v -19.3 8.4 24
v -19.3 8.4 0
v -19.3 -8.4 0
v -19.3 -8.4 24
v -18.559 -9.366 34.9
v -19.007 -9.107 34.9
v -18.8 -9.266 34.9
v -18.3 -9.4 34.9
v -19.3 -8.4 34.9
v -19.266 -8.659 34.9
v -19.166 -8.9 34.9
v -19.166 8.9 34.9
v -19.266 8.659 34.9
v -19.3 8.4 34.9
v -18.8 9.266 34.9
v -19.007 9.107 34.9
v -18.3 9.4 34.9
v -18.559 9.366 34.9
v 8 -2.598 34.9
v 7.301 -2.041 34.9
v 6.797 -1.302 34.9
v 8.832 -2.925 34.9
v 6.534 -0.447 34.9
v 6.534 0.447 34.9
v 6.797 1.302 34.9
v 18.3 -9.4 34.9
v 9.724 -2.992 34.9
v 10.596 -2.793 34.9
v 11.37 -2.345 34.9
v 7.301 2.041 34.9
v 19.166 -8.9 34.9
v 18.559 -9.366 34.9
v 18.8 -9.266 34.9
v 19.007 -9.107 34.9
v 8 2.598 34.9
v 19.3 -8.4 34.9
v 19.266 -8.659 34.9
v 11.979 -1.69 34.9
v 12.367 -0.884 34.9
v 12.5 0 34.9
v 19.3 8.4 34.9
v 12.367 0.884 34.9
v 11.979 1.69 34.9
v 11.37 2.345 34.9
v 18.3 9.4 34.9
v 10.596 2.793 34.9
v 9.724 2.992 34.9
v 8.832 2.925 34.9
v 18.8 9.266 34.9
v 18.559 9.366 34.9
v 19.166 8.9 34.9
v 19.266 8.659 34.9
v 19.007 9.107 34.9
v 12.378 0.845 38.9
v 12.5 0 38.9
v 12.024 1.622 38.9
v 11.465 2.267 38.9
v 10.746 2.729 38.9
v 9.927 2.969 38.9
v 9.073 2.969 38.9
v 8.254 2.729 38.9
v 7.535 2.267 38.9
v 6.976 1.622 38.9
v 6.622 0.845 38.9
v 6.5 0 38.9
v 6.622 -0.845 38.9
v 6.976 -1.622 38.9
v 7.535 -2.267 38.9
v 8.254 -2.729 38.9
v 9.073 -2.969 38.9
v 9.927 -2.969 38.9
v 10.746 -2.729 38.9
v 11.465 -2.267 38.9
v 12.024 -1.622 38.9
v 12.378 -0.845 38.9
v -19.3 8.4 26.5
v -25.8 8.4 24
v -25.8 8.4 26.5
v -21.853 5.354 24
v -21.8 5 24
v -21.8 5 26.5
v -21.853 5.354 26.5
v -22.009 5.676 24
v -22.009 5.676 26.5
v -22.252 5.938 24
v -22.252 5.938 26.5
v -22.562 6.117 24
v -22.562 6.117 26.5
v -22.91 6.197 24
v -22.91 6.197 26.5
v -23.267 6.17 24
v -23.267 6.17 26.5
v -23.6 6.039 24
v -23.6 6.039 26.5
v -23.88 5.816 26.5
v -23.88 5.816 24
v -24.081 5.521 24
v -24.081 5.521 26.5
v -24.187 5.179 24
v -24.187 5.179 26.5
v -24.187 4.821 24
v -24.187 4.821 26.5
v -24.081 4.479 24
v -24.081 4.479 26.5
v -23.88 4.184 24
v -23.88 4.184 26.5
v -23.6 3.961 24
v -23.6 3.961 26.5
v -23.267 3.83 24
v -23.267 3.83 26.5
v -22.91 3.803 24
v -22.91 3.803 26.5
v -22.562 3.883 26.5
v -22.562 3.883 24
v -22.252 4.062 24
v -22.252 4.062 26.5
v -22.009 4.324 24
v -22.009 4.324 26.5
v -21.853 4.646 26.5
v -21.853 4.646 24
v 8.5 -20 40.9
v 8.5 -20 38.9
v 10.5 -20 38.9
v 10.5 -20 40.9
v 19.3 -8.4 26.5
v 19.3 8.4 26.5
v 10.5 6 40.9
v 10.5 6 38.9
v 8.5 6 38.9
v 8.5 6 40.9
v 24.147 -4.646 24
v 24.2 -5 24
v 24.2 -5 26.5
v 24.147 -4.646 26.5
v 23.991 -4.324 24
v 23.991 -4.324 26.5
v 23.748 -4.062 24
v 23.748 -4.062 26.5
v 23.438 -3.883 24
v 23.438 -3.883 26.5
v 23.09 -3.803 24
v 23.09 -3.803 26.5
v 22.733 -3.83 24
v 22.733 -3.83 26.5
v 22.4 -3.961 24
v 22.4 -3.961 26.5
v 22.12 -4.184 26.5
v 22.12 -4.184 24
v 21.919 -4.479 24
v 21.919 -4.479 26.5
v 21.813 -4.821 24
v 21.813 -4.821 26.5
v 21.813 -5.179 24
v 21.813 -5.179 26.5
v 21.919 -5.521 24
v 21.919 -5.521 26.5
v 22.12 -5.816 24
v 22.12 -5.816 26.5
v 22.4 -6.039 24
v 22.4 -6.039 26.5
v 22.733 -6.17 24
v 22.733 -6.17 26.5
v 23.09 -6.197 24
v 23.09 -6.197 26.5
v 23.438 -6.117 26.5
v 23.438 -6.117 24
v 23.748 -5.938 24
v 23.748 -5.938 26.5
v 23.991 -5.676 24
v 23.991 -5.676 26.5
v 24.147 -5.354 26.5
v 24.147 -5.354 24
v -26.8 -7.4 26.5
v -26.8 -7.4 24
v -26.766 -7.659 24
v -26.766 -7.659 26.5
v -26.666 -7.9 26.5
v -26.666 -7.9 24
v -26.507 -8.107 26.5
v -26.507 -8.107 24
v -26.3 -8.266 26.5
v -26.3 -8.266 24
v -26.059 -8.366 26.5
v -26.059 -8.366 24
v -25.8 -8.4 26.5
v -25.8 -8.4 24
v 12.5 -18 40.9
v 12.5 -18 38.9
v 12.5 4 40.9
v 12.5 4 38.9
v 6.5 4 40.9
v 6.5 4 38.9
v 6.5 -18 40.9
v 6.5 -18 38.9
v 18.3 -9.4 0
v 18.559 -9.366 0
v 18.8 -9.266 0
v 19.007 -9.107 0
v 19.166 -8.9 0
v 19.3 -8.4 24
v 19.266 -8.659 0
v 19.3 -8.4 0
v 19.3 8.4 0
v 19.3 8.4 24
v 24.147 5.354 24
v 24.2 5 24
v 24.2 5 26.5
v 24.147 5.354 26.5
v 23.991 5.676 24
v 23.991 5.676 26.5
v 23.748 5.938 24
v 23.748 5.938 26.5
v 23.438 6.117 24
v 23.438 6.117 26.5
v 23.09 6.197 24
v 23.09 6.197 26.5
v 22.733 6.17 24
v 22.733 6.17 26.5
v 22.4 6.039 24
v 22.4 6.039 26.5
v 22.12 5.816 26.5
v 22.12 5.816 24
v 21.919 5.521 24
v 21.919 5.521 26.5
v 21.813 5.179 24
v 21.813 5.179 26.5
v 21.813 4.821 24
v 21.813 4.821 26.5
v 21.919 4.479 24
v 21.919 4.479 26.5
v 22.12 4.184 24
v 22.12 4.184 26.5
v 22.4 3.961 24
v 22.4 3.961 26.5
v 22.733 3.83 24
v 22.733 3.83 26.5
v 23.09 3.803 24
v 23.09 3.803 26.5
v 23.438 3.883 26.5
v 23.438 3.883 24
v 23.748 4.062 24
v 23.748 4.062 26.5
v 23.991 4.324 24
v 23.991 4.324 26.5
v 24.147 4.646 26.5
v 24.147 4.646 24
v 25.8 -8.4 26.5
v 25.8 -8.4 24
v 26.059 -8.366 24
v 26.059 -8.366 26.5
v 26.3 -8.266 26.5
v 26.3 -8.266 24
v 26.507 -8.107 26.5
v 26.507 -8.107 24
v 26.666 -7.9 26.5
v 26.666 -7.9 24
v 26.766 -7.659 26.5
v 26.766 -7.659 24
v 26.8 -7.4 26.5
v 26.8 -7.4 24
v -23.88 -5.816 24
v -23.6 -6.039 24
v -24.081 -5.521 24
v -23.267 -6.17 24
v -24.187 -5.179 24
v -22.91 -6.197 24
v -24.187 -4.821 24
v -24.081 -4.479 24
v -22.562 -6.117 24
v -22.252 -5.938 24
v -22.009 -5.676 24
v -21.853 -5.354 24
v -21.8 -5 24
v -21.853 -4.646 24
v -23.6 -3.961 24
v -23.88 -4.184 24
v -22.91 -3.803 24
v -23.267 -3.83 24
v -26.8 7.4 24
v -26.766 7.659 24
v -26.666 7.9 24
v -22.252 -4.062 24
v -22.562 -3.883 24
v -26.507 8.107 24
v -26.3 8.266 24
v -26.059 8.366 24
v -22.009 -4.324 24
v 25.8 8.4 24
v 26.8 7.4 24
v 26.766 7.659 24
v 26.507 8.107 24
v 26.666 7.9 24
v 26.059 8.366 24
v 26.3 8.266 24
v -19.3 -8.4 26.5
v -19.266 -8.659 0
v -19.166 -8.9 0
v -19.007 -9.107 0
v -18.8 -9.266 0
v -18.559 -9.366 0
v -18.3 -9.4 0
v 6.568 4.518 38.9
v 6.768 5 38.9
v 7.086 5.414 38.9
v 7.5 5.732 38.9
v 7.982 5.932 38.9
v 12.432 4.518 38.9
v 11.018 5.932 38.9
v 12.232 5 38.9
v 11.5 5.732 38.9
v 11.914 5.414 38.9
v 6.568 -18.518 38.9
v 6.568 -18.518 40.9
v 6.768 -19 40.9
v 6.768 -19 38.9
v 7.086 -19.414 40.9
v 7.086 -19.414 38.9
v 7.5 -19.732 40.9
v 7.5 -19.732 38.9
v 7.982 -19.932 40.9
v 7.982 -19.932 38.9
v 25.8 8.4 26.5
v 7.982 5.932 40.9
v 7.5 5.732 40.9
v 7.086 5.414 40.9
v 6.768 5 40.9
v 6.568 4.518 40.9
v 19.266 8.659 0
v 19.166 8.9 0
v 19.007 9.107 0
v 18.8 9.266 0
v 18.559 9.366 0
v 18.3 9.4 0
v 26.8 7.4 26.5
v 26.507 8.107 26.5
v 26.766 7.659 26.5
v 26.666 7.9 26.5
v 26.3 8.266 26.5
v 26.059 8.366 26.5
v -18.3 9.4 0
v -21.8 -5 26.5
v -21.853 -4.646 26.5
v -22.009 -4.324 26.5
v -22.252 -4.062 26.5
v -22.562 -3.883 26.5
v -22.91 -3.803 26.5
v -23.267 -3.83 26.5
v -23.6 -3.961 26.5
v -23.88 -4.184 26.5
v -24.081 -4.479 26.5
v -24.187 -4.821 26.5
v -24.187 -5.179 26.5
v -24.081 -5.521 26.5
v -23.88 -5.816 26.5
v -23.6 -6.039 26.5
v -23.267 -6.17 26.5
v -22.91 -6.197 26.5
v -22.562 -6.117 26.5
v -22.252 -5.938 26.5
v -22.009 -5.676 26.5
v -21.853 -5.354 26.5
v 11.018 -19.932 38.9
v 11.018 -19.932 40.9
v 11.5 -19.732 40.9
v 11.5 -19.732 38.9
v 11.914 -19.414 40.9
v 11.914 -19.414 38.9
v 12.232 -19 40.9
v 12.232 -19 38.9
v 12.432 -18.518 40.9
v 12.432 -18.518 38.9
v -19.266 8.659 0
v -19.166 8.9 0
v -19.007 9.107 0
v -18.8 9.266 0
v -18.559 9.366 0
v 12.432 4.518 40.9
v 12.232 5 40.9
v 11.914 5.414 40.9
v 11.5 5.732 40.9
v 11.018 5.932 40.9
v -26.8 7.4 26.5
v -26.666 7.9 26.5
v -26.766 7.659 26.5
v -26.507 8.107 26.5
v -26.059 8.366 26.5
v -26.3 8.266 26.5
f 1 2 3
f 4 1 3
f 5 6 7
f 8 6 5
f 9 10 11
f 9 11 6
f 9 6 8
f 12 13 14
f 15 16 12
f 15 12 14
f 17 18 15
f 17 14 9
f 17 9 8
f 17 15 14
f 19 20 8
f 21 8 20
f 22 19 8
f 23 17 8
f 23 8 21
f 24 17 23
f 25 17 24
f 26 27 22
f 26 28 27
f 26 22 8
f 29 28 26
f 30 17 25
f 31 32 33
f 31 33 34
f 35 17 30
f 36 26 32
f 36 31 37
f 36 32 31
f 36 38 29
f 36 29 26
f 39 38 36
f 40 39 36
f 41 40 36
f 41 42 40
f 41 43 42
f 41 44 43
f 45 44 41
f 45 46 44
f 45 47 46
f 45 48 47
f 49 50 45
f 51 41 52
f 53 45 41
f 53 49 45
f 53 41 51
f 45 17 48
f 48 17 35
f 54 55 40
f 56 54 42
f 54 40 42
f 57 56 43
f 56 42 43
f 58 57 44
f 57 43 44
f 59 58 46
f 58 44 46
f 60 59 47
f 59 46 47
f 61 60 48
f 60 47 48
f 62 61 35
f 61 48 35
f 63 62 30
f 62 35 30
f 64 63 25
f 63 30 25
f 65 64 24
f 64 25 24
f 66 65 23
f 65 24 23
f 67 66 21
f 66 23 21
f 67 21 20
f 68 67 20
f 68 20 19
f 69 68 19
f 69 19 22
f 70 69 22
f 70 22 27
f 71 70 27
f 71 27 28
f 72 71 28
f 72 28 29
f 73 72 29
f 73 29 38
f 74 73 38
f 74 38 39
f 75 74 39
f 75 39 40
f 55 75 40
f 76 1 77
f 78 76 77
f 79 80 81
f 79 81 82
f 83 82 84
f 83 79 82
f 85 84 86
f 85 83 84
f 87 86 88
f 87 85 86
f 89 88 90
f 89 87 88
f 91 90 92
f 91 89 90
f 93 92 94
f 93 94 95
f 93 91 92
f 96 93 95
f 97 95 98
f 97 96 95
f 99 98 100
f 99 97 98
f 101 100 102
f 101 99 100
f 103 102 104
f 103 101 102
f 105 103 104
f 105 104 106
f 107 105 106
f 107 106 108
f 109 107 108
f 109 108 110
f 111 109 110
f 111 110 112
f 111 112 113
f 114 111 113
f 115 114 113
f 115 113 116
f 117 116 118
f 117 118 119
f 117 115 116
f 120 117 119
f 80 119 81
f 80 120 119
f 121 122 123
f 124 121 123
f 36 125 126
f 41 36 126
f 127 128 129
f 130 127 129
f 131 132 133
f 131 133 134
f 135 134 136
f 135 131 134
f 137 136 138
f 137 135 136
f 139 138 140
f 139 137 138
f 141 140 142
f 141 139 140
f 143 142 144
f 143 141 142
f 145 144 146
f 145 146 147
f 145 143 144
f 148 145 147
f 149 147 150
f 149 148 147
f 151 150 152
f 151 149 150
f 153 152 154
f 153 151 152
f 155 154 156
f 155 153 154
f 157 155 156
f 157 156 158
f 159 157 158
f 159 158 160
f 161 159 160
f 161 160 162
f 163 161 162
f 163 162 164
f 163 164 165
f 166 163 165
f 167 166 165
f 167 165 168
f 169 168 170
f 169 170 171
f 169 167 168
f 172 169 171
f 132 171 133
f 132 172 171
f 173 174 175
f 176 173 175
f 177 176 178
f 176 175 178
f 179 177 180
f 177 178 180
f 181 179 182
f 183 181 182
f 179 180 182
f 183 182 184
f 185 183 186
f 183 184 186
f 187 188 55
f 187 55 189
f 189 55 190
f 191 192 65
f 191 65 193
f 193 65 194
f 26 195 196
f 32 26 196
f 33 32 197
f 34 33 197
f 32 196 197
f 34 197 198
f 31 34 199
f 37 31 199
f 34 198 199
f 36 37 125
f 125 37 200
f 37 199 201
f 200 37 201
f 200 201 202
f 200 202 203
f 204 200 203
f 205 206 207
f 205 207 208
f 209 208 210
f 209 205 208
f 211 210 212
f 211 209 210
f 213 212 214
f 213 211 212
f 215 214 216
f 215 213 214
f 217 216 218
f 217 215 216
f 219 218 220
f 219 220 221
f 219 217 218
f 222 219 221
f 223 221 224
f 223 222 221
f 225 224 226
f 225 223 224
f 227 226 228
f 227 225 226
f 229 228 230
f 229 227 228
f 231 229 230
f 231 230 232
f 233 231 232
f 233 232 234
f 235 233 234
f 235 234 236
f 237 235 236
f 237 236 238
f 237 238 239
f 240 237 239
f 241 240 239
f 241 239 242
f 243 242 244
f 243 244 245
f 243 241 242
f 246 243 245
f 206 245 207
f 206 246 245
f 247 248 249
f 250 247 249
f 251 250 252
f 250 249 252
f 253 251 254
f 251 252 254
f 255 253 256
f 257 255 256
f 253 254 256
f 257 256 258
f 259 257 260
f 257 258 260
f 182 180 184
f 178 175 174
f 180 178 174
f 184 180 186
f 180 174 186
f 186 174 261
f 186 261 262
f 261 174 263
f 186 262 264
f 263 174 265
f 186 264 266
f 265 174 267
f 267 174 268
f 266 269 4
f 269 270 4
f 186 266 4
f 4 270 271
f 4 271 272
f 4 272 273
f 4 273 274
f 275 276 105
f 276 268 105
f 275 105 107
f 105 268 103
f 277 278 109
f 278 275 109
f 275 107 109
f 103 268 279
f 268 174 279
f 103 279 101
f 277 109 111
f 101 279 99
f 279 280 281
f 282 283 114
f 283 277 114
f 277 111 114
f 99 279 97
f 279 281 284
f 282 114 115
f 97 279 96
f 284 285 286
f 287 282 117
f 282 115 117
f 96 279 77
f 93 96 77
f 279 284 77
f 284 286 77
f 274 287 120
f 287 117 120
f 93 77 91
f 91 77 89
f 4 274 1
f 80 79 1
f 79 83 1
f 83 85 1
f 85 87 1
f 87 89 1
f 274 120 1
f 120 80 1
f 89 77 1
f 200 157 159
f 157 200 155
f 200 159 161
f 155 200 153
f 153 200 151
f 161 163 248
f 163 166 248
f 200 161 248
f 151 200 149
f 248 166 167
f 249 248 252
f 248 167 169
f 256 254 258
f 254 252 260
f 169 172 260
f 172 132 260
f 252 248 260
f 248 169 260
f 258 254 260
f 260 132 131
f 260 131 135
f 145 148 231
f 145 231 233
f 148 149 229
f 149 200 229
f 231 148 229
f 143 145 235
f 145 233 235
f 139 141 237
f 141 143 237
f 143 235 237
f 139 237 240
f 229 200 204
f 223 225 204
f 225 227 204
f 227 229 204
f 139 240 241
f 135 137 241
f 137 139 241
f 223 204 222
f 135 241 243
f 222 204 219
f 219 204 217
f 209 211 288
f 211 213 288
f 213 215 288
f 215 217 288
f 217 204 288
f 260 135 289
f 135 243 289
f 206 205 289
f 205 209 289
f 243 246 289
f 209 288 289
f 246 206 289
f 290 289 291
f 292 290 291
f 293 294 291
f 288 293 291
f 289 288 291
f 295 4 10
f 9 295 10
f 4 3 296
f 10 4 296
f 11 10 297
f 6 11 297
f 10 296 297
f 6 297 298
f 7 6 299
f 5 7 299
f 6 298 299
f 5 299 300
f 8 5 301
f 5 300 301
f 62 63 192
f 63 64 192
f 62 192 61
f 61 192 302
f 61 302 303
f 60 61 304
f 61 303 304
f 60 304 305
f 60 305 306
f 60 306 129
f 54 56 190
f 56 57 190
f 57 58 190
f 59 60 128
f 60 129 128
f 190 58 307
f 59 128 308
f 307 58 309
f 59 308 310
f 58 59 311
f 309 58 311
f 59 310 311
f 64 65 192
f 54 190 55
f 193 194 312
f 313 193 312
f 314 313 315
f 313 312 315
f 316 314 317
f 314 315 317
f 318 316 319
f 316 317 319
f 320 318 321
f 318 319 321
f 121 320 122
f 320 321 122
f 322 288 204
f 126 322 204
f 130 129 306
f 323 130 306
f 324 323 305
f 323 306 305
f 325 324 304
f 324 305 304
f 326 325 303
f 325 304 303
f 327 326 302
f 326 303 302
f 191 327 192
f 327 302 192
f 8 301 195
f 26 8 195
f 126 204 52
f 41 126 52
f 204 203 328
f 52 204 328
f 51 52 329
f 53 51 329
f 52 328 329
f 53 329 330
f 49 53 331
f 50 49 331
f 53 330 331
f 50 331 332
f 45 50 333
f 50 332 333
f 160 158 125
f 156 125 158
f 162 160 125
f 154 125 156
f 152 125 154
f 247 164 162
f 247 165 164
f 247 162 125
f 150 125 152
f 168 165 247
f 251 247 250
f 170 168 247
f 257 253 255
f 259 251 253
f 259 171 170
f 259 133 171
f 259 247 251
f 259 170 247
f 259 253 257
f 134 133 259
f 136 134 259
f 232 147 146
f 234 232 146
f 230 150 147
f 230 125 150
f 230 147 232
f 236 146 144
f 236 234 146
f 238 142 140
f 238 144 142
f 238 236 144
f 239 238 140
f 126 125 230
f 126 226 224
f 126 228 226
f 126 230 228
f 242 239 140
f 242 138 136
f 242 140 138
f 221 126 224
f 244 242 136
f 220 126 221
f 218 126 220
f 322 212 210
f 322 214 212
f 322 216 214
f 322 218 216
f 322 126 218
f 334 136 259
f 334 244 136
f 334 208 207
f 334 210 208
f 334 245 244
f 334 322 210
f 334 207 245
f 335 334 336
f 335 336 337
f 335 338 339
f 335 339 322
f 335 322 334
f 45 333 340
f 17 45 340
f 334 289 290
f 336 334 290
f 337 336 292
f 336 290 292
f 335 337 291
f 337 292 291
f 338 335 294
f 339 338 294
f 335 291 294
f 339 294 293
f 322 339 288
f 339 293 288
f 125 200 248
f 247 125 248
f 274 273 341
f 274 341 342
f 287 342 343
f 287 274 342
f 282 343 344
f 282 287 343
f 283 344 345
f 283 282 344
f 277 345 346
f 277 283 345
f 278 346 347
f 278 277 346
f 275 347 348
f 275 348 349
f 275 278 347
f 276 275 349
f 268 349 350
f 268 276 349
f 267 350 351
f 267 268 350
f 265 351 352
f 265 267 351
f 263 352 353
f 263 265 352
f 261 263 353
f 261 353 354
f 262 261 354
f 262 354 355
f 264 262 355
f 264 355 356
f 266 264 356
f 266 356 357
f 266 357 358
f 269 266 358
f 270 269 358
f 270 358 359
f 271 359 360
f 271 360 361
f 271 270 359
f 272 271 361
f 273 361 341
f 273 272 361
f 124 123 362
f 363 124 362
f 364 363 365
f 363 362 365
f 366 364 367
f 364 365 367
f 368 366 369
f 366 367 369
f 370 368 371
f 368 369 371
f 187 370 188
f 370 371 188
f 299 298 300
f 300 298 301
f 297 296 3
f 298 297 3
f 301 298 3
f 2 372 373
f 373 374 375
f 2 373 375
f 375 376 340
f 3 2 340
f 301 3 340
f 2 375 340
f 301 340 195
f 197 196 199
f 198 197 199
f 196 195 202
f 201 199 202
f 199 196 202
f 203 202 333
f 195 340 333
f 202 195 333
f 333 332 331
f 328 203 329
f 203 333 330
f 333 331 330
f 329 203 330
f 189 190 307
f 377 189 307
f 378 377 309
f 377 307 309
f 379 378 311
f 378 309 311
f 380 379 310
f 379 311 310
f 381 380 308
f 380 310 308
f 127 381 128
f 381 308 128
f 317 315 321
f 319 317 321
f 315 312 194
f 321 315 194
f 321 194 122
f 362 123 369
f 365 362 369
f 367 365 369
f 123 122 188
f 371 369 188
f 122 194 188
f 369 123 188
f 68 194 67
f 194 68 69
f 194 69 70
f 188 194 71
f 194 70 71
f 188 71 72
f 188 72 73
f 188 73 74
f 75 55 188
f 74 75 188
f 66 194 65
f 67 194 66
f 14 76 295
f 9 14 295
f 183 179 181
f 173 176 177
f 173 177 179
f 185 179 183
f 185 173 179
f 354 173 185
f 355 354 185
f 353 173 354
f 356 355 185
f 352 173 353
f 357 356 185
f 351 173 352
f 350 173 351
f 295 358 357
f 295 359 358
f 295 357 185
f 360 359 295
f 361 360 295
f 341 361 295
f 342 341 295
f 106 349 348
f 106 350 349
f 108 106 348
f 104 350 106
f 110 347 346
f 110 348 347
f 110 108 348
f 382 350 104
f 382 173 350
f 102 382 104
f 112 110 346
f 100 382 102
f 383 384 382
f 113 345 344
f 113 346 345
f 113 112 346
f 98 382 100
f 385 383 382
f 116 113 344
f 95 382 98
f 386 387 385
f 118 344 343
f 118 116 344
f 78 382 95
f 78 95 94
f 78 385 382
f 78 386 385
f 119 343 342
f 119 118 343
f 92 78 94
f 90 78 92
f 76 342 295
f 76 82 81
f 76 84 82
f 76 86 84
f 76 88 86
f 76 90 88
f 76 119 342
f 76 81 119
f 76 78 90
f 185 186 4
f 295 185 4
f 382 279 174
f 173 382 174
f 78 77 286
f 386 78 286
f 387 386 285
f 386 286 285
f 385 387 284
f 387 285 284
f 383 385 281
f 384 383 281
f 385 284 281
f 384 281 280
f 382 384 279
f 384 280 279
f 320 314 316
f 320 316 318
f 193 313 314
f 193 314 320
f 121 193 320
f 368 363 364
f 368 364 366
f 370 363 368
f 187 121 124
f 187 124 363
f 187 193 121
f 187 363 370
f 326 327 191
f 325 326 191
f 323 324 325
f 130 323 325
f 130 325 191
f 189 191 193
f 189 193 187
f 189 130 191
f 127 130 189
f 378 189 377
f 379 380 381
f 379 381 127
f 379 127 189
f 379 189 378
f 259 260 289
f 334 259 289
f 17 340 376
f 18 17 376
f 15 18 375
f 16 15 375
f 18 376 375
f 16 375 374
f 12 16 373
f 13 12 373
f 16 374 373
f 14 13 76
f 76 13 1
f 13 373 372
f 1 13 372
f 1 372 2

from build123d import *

# Parameters (mm, degrees)
BOSS_EXTRUDE1_DEPTH = 34.9
BOSS_EXTRUDE2_DEPTH = 2.5
SKETCH3_R           = 1.2
CUT_EXTRUDE1_DEPTH  = 2.5
SKETCH4_R           = 3
BOSS_EXTRUDE3_DEPTH = 4
BOSS_EXTRUDE4_DEPTH = 2


with BuildPart() as part:
    # Sketch1 → Boss-Extrude1 (new body)
    with BuildSketch(Plane.XY):
        with BuildLine():
            Line((-18.3, -9.4), (18.3, -9.4))
            ThreePointArc((18.3, -9.4), (19.007106781, -9.107106781), (19.3, -8.4))
            Line((19.3, -8.4), (19.3, 8.4))
            ThreePointArc((19.3, 8.4), (19.007106781, 9.107106781), (18.3, 9.4))
            Line((18.3, 9.4), (-18.3, 9.4))
            ThreePointArc((-18.3, 9.4), (-19.007106781, 9.107106781), (-19.3, 8.4))
            Line((-19.3, 8.4), (-19.3, -8.4))
            ThreePointArc((-19.3, -8.4), (-19.007106781, -9.107106781), (-18.3, -9.4))
        make_face()
    extrude(amount=BOSS_EXTRUDE1_DEPTH)

    # Sketch2 → Boss-Extrude2 (add)
    with BuildSketch(Plane.XY.offset(24)):
        with BuildLine():
            Line((-25.8, -8.4), (25.8, -8.4))
            ThreePointArc((25.8, -8.4), (26.507106781, -8.107106781), (26.8, -7.4))
            Line((26.8, -7.4), (26.8, 7.4))
            ThreePointArc((26.8, 7.4), (26.507106781, 8.107106781), (25.8, 8.4))
            Line((25.8, 8.4), (-25.8, 8.4))
            ThreePointArc((-25.8, 8.4), (-26.507106781, 8.107106781), (-26.8, 7.4))
            Line((-26.8, 7.4), (-26.8, -7.4))
            ThreePointArc((-26.8, -7.4), (-26.507106781, -8.107106781), (-25.8, -8.4))
        make_face()
    extrude(amount=BOSS_EXTRUDE2_DEPTH)

    # Sketch3 → Cut-Extrude1 (cut)
    with BuildSketch(Plane.XY.offset(24)):
        with Locations((23, 5)):
            Circle(SKETCH3_R)
        with Locations((23, -5)):
            Circle(SKETCH3_R)
        with Locations((-23, 5)):
            Circle(SKETCH3_R)
        with Locations((-23, -5)):
            Circle(SKETCH3_R)
    extrude(amount=CUT_EXTRUDE1_DEPTH, mode=Mode.SUBTRACT)

    # Sketch4 → Boss-Extrude3 (add)
    with BuildSketch(Plane.XY.offset(34.9)):
        with Locations((9.5, 0)):
            Circle(SKETCH4_R)
    extrude(amount=BOSS_EXTRUDE3_DEPTH)

    # Sketch5 → Boss-Extrude4 (add)
    with BuildSketch(Plane.XY.offset(38.9)):
        with BuildLine():
            Line((8.5, -20), (10.5, -20))
            ThreePointArc((10.5, -20), (11.914213562, -19.414213562), (12.5, -18))
            Line((12.5, -18), (12.5, 4))
            ThreePointArc((12.5, 4), (11.914213562, 5.414213562), (10.5, 6))
            Line((10.5, 6), (8.5, 6))
            ThreePointArc((8.5, 6), (7.085786438, 5.414213562), (6.5, 4))
            Line((6.5, 4), (6.5, -18))
            ThreePointArc((6.5, -18), (7.085786438, -19.414213562), (8.5, -20))
        make_face()
    extrude(amount=BOSS_EXTRUDE4_DEPTH)


solid = part.part
